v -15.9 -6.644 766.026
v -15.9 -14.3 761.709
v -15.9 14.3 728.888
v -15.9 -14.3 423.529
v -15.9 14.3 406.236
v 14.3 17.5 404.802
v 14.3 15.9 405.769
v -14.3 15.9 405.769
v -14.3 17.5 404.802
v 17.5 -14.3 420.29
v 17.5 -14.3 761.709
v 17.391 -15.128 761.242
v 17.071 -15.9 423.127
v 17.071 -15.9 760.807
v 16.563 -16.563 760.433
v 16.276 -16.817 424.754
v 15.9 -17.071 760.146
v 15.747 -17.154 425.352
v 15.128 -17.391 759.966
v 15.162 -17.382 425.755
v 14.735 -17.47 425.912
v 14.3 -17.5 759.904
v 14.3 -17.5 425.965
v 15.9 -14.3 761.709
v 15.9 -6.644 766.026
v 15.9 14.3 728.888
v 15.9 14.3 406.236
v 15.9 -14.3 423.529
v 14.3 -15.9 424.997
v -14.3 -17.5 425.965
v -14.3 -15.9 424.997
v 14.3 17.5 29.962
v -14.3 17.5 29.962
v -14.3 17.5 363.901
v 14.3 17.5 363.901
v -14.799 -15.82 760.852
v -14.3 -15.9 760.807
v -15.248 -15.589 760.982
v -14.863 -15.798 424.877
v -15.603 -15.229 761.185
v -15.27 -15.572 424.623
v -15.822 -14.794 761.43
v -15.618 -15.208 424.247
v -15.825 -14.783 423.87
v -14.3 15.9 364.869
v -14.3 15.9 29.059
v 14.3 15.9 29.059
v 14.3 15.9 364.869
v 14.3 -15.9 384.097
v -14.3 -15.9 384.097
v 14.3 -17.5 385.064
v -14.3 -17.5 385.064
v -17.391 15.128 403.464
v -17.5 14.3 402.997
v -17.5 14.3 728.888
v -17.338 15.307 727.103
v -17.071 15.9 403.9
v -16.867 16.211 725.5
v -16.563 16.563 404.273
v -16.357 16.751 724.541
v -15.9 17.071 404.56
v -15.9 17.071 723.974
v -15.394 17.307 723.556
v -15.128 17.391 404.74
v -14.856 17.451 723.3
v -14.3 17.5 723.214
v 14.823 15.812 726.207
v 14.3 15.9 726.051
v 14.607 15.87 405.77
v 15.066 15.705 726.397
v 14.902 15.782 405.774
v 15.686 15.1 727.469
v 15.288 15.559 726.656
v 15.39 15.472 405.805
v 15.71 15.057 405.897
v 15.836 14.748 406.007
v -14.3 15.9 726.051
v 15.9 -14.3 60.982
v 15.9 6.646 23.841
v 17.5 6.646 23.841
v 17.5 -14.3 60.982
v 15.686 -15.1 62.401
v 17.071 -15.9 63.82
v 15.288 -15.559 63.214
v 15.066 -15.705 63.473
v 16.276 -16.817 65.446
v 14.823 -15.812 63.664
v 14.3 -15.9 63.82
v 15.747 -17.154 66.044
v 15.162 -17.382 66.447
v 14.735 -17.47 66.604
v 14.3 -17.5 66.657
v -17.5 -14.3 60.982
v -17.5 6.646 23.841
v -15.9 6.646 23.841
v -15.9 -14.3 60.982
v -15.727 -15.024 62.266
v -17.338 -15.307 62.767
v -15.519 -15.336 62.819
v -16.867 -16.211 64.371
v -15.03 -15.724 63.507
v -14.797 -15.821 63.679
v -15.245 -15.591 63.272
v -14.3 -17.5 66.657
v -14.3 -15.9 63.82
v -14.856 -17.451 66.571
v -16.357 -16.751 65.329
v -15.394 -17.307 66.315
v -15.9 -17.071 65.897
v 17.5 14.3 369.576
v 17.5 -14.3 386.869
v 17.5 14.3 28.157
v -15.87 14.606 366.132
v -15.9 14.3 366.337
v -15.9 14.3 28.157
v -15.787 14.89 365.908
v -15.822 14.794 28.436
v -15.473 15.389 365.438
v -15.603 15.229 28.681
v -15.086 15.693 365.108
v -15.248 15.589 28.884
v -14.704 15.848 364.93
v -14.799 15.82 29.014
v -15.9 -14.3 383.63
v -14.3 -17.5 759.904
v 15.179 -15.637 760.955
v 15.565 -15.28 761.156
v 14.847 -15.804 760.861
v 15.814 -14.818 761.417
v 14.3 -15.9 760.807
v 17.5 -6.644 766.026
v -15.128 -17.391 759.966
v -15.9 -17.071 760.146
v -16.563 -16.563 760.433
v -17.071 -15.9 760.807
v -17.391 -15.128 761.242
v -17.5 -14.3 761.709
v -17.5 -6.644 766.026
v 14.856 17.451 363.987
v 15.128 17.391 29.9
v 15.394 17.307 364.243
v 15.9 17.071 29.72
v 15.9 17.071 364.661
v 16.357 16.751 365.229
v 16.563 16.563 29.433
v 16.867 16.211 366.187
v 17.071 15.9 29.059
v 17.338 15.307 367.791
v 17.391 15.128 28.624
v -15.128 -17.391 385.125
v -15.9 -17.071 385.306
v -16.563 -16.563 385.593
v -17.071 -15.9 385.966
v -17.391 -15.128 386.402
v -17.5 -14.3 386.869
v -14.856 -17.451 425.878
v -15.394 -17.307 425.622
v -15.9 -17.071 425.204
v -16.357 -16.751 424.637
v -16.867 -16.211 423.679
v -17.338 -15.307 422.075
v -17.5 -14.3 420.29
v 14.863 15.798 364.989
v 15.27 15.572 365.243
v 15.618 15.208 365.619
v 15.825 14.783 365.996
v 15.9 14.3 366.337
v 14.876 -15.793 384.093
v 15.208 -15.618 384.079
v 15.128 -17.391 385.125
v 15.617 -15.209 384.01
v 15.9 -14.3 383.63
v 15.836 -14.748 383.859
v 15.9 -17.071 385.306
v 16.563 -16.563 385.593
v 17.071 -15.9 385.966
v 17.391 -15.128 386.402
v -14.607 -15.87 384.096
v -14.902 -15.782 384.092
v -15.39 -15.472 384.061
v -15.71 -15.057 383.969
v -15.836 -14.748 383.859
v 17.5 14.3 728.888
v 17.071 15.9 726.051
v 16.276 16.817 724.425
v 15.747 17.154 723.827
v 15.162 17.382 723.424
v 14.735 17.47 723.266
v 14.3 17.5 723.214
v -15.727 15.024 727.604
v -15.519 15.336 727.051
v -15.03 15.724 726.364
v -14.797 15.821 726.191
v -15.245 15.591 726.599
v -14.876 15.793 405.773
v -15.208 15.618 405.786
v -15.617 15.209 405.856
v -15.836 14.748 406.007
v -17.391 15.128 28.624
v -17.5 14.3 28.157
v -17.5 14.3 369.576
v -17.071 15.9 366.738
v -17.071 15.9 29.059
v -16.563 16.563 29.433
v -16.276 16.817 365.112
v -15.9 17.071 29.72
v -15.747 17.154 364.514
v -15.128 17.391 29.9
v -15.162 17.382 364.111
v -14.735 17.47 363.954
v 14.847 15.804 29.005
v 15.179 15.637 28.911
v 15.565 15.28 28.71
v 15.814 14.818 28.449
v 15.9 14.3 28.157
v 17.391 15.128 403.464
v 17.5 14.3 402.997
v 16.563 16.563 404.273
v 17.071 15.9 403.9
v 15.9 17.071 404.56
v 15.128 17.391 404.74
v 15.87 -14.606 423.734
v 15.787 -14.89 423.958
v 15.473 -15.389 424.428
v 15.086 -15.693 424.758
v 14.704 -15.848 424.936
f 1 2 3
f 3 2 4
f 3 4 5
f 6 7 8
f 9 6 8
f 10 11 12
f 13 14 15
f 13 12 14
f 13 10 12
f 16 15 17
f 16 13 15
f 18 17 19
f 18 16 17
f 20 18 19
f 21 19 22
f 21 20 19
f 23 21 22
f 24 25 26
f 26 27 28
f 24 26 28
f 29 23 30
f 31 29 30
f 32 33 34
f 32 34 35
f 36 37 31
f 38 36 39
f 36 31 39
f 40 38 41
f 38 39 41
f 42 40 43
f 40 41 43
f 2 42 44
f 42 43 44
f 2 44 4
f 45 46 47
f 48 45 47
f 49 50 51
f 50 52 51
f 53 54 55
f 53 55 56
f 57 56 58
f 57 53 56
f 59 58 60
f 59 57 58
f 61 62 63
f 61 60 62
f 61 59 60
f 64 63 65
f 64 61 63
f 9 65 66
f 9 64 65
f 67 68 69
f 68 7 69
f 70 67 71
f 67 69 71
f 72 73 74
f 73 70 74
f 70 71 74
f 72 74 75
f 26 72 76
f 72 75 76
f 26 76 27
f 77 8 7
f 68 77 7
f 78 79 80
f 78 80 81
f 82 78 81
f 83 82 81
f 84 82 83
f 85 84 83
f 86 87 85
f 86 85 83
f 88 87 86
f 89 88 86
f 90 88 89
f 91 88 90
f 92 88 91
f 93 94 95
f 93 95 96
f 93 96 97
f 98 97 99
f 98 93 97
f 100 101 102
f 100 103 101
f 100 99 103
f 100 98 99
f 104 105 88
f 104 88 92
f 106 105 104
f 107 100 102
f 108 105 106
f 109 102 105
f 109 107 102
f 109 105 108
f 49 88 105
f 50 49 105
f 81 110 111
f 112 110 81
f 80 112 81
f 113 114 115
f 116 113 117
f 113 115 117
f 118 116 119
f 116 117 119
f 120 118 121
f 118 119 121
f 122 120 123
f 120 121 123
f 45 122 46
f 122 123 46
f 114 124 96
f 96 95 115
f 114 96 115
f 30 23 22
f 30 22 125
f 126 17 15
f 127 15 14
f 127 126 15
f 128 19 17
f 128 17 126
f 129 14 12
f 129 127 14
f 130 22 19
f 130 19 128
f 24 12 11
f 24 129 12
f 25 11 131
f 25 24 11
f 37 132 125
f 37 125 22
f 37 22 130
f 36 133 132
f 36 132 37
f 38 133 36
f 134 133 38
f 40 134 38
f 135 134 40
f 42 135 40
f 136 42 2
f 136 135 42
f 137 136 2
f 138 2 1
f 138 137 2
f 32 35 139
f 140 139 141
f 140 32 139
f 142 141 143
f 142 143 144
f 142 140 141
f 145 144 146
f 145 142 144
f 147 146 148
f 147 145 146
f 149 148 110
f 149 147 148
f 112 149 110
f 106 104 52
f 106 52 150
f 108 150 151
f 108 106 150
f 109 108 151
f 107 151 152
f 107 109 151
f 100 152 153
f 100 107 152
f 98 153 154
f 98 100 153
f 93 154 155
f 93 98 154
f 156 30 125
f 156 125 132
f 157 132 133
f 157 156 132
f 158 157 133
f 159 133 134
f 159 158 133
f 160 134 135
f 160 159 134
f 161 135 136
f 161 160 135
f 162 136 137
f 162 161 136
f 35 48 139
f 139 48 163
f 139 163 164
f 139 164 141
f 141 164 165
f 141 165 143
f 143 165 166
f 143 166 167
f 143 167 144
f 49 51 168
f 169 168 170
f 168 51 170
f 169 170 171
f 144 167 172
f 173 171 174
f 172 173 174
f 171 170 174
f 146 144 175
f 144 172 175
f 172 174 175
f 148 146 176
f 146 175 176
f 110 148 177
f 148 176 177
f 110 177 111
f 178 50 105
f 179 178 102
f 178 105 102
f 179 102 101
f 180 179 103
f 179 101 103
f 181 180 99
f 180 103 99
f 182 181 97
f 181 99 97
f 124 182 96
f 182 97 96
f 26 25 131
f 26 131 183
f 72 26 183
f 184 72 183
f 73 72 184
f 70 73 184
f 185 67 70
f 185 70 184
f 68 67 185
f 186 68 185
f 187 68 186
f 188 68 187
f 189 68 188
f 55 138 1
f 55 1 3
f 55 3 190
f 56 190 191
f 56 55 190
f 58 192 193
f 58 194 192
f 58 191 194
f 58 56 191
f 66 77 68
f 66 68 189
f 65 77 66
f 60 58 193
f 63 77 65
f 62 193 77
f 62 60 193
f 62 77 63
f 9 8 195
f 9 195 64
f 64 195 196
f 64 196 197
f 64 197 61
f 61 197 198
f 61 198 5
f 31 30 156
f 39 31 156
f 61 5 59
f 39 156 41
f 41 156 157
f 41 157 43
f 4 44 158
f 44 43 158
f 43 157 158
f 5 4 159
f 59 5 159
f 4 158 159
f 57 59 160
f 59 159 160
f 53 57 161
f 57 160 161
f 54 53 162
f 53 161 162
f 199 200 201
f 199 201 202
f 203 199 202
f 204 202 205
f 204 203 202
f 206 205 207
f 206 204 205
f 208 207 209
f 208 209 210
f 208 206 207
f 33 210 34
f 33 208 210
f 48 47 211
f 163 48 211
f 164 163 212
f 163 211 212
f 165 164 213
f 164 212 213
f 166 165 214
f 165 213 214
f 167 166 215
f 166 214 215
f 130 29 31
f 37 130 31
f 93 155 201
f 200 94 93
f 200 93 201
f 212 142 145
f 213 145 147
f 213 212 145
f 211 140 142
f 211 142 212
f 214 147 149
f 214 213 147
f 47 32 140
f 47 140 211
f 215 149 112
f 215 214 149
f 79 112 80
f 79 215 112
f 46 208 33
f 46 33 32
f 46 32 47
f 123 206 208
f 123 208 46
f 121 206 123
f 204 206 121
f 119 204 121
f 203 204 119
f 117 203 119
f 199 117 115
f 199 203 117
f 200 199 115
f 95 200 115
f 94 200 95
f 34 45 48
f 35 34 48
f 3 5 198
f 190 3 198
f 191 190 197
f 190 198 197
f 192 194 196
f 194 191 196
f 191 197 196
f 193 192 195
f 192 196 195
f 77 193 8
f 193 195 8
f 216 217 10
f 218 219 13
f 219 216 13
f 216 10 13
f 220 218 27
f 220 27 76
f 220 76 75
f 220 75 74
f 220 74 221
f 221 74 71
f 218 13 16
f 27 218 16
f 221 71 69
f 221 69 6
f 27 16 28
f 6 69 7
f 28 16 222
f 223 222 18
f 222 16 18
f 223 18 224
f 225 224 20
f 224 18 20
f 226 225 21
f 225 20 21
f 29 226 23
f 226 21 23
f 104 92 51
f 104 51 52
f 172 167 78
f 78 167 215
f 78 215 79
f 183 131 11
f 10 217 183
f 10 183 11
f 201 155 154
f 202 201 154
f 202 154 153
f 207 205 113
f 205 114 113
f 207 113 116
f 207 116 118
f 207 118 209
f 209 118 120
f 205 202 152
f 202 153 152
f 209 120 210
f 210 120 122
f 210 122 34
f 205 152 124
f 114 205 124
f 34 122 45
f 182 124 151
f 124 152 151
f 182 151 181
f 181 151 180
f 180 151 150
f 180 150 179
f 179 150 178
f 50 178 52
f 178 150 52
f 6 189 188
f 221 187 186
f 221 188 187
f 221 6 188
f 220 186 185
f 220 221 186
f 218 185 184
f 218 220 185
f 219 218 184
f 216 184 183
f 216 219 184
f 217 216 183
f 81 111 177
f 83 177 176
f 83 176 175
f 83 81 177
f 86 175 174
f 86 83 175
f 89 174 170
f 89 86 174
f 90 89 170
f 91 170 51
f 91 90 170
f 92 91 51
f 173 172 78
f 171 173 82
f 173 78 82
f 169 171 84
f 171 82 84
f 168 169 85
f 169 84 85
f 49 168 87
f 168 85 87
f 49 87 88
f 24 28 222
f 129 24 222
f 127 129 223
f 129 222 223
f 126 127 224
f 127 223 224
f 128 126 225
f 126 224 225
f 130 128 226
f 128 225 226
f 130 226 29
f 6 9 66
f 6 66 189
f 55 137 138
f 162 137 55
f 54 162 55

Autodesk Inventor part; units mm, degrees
ref_plane "Start plane" through (0, 0, 4.5945) normal (0, 0, 1) x (1, 0, 0)
ref_plane "End plane" through (0, 0, 779.6439) normal (0, 0, 1) x (1, 0, 0)
sketch "Sketch" plane through (0, 0, 0) normal (0, 0, 1) x (1, 0, 0)
  line L0 (-17.5, -14.3) -> (-17.5, 14.3)
  line L1 (-14.3, 17.5) -> (14.3, 17.5)
  line L2 (17.5, 14.3) -> (17.5, -14.3)
  line L3 (14.3, -17.5) -> (-14.3, -17.5)
  arc A0 (-17.5, -14.3) -> (-14.3, -17.5) centre (-14.3, -14.3) ccw
  arc A1 (-14.3, 17.5) -> (-17.5, 14.3) centre (-14.3, 14.3) ccw
  arc A2 (17.5, 14.3) -> (14.3, 17.5) centre (14.3, 14.3) ccw
  arc A3 (14.3, -17.5) -> (17.5, -14.3) centre (14.3, -14.3) ccw
  arc A4 (-14.3, 15.9) -> (-15.9, 14.3) centre (-14.3, 14.3) ccw
  line L4 (-14.3, 15.9) -> (14.3, 15.9)
  arc A5 (15.9, 14.3) -> (14.3, 15.9) centre (14.3, 14.3) ccw
  line L5 (15.9, 14.3) -> (15.9, -14.3)
  arc A6 (14.3, -15.9) -> (15.9, -14.3) centre (14.3, -14.3) ccw
  line L6 (14.3, -15.9) -> (-14.3, -15.9)
  arc A7 (-15.9, -14.3) -> (-14.3, -15.9) centre (-14.3, -14.3) ccw
  line L7 (-15.9, -14.3) -> (-15.9, 14.3)
  line L8 (0, 25.4278) -> (0, -25.4278) construction
  line L9 (-25.4278, 0) -> (25.4278, 0) construction
  dimension "d7" = 3.2
  dimension "d10" = 35
  dimension "d11" = 35
  dimension "d12" = 1.6
  dimension "d15" = 17.5
  dimension "d16" = 17.5
extrude "Body" add sketch "Sketch" along normal up to surface (775.0495 mm away) from surface at 4.5945
sketch "Sketch3" plane through (0, 0, 0) normal (0, 0, 1) x (1, 0, 0)
  line L0 (0, 0) -> (10, 0)
ref_plane "Work Plane3" through (0, 0, 0) normal (0, -1, 0) x (1, 0, 0)
sketch "Sketch4" plane through (0, 0, 0) normal (0, -1, 0) x (1, 0, 0)
  line L0 (-2, 4.5945) -> (12, 4.5945)
  line L1 (-2, 779.6439) -> (12, 779.6439)
  dimension "d18" = 775.0495
ref_plane "Work Plane4" through (0, 329.3648, 205.8375) normal (0, 0.4912, -0.871) x (1, 0, 0)
split "Split1" plane through (0, 329.3648, 205.8375) removes the side toward (0, 0.4912, -0.871)
ref_plane "Work Plane5" through (0, 15.2431, 8.5964) normal (0, -0.871, -0.4912) x (1, 0, 0)
split "Split2" plane through (0, 15.2431, 8.5964) removes the side toward (0, -0.871, -0.4912)
ref_plane "Work Plane6" through (0, 355.4612, 123.9381) normal (0, 0.871, 0.4912) x (1, 0, 0)
split "Split3" plane through (0, 355.4612, 123.9381) removes the side toward (0, 0.871, 0.4912)
ref_plane "Work Plane7" through (0, -329.3648, 584.0283) normal (0, -0.4912, 0.871) x (1, 0, 0)
split "Split4" plane through (0, -329.3648, 584.0283) removes the side toward (0, -0.4912, 0.871)
ref_plane "Work Plane8" through (0, -329.3648, 584.0283) normal (0, -0.4912, 0.871) x (-1, 0, 0)
ref_plane "Work Plane9" through (0, 329.3648, 205.8375) normal (0, 0.4912, -0.871) x (-1, 0, 0)
ref_plane "Work Plane10" through (0, 0, 394.9329) normal (0, 0.8557, -0.5174) x (-1, 0, 0)
sketch "Sketch5" plane through (0, 0, 394.9329) normal (0, 0.8557, -0.5174) x (-1, 0, 0)
  arc A0 (-17.5, -14.3) -> (-14.3, -17.5) centre (-14.3, -14.3) ccw
  line L0 (-17.5, -14.3) -> (-17.5, 14.3)
  arc A1 (-14.3, 17.5) -> (-17.5, 14.3) centre (-14.3, 14.3) ccw
  line L1 (-14.3, 17.5) -> (14.3, 17.5)
  arc A2 (17.5, 14.3) -> (14.3, 17.5) centre (14.3, 14.3) ccw
  line L2 (17.5, 14.3) -> (17.5, -14.3)
  arc A3 (14.3, -17.5) -> (17.5, -14.3) centre (14.3, -14.3) ccw
  line L3 (14.3, -17.5) -> (-14.3, -17.5)
  arc A4 (-14.3, 15.9) -> (-15.9, 14.3) centre (-14.3, 14.3) ccw
  line L4 (-14.3, 15.9) -> (14.3, 15.9)
  arc A5 (15.9, 14.3) -> (14.3, 15.9) centre (14.3, 14.3) ccw
  line L5 (15.9, 14.3) -> (15.9, -14.3)
  arc A6 (14.3, -15.9) -> (15.9, -14.3) centre (14.3, -14.3) ccw
  line L6 (14.3, -15.9) -> (-14.3, -15.9)
  arc A7 (-15.9, -14.3) -> (-14.3, -15.9) centre (-14.3, -14.3) ccw
  line L7 (-15.9, -14.3) -> (-15.9, 14.3)
extrude "Extrusion2" cut sketch "Sketch5" along normal up to surface from surface at -379.6898 contours L0 A1 L1 A2 L2 A3 L3 A0 | L4 A5 L5 A6 L6 A7 L7 A4 surface through (0, 329.3648, 205.8375) normal (0, 0.4912, -0.871)
equation "\"d7\" = G_IR"
equation "\"d10\" = G_H"
equation "\"d11\" = G_W"
equation "\"d12\" = G_T"
equation "\"d15\" = 0.5 * d10"
equation "\"d16\" = 0.5 * d11"
equation "\"d3\" = G_L"
equation "\"G_W\" = 35"
equation "\"G_H\" = 35"
equation "\"G_T\" = 1.6"
equation "\"G_IR\" = 3.2"
equation "\"G_L\" = d18"
equation "\"G_OFFSET_START\" = -4.59446"
equation "\"G_OFFSET_END\" = -10.22188"
equation "\"d13\" = -G_OFFSET_START"
equation "\"d14\" = G_OFFSET_END + B_L"
equation "\"B_L\" = 789.86581"
properties part number "AS 1163 - C350L0 35x35x1.6 SHS - 775.049" material "Steel, Mild"
